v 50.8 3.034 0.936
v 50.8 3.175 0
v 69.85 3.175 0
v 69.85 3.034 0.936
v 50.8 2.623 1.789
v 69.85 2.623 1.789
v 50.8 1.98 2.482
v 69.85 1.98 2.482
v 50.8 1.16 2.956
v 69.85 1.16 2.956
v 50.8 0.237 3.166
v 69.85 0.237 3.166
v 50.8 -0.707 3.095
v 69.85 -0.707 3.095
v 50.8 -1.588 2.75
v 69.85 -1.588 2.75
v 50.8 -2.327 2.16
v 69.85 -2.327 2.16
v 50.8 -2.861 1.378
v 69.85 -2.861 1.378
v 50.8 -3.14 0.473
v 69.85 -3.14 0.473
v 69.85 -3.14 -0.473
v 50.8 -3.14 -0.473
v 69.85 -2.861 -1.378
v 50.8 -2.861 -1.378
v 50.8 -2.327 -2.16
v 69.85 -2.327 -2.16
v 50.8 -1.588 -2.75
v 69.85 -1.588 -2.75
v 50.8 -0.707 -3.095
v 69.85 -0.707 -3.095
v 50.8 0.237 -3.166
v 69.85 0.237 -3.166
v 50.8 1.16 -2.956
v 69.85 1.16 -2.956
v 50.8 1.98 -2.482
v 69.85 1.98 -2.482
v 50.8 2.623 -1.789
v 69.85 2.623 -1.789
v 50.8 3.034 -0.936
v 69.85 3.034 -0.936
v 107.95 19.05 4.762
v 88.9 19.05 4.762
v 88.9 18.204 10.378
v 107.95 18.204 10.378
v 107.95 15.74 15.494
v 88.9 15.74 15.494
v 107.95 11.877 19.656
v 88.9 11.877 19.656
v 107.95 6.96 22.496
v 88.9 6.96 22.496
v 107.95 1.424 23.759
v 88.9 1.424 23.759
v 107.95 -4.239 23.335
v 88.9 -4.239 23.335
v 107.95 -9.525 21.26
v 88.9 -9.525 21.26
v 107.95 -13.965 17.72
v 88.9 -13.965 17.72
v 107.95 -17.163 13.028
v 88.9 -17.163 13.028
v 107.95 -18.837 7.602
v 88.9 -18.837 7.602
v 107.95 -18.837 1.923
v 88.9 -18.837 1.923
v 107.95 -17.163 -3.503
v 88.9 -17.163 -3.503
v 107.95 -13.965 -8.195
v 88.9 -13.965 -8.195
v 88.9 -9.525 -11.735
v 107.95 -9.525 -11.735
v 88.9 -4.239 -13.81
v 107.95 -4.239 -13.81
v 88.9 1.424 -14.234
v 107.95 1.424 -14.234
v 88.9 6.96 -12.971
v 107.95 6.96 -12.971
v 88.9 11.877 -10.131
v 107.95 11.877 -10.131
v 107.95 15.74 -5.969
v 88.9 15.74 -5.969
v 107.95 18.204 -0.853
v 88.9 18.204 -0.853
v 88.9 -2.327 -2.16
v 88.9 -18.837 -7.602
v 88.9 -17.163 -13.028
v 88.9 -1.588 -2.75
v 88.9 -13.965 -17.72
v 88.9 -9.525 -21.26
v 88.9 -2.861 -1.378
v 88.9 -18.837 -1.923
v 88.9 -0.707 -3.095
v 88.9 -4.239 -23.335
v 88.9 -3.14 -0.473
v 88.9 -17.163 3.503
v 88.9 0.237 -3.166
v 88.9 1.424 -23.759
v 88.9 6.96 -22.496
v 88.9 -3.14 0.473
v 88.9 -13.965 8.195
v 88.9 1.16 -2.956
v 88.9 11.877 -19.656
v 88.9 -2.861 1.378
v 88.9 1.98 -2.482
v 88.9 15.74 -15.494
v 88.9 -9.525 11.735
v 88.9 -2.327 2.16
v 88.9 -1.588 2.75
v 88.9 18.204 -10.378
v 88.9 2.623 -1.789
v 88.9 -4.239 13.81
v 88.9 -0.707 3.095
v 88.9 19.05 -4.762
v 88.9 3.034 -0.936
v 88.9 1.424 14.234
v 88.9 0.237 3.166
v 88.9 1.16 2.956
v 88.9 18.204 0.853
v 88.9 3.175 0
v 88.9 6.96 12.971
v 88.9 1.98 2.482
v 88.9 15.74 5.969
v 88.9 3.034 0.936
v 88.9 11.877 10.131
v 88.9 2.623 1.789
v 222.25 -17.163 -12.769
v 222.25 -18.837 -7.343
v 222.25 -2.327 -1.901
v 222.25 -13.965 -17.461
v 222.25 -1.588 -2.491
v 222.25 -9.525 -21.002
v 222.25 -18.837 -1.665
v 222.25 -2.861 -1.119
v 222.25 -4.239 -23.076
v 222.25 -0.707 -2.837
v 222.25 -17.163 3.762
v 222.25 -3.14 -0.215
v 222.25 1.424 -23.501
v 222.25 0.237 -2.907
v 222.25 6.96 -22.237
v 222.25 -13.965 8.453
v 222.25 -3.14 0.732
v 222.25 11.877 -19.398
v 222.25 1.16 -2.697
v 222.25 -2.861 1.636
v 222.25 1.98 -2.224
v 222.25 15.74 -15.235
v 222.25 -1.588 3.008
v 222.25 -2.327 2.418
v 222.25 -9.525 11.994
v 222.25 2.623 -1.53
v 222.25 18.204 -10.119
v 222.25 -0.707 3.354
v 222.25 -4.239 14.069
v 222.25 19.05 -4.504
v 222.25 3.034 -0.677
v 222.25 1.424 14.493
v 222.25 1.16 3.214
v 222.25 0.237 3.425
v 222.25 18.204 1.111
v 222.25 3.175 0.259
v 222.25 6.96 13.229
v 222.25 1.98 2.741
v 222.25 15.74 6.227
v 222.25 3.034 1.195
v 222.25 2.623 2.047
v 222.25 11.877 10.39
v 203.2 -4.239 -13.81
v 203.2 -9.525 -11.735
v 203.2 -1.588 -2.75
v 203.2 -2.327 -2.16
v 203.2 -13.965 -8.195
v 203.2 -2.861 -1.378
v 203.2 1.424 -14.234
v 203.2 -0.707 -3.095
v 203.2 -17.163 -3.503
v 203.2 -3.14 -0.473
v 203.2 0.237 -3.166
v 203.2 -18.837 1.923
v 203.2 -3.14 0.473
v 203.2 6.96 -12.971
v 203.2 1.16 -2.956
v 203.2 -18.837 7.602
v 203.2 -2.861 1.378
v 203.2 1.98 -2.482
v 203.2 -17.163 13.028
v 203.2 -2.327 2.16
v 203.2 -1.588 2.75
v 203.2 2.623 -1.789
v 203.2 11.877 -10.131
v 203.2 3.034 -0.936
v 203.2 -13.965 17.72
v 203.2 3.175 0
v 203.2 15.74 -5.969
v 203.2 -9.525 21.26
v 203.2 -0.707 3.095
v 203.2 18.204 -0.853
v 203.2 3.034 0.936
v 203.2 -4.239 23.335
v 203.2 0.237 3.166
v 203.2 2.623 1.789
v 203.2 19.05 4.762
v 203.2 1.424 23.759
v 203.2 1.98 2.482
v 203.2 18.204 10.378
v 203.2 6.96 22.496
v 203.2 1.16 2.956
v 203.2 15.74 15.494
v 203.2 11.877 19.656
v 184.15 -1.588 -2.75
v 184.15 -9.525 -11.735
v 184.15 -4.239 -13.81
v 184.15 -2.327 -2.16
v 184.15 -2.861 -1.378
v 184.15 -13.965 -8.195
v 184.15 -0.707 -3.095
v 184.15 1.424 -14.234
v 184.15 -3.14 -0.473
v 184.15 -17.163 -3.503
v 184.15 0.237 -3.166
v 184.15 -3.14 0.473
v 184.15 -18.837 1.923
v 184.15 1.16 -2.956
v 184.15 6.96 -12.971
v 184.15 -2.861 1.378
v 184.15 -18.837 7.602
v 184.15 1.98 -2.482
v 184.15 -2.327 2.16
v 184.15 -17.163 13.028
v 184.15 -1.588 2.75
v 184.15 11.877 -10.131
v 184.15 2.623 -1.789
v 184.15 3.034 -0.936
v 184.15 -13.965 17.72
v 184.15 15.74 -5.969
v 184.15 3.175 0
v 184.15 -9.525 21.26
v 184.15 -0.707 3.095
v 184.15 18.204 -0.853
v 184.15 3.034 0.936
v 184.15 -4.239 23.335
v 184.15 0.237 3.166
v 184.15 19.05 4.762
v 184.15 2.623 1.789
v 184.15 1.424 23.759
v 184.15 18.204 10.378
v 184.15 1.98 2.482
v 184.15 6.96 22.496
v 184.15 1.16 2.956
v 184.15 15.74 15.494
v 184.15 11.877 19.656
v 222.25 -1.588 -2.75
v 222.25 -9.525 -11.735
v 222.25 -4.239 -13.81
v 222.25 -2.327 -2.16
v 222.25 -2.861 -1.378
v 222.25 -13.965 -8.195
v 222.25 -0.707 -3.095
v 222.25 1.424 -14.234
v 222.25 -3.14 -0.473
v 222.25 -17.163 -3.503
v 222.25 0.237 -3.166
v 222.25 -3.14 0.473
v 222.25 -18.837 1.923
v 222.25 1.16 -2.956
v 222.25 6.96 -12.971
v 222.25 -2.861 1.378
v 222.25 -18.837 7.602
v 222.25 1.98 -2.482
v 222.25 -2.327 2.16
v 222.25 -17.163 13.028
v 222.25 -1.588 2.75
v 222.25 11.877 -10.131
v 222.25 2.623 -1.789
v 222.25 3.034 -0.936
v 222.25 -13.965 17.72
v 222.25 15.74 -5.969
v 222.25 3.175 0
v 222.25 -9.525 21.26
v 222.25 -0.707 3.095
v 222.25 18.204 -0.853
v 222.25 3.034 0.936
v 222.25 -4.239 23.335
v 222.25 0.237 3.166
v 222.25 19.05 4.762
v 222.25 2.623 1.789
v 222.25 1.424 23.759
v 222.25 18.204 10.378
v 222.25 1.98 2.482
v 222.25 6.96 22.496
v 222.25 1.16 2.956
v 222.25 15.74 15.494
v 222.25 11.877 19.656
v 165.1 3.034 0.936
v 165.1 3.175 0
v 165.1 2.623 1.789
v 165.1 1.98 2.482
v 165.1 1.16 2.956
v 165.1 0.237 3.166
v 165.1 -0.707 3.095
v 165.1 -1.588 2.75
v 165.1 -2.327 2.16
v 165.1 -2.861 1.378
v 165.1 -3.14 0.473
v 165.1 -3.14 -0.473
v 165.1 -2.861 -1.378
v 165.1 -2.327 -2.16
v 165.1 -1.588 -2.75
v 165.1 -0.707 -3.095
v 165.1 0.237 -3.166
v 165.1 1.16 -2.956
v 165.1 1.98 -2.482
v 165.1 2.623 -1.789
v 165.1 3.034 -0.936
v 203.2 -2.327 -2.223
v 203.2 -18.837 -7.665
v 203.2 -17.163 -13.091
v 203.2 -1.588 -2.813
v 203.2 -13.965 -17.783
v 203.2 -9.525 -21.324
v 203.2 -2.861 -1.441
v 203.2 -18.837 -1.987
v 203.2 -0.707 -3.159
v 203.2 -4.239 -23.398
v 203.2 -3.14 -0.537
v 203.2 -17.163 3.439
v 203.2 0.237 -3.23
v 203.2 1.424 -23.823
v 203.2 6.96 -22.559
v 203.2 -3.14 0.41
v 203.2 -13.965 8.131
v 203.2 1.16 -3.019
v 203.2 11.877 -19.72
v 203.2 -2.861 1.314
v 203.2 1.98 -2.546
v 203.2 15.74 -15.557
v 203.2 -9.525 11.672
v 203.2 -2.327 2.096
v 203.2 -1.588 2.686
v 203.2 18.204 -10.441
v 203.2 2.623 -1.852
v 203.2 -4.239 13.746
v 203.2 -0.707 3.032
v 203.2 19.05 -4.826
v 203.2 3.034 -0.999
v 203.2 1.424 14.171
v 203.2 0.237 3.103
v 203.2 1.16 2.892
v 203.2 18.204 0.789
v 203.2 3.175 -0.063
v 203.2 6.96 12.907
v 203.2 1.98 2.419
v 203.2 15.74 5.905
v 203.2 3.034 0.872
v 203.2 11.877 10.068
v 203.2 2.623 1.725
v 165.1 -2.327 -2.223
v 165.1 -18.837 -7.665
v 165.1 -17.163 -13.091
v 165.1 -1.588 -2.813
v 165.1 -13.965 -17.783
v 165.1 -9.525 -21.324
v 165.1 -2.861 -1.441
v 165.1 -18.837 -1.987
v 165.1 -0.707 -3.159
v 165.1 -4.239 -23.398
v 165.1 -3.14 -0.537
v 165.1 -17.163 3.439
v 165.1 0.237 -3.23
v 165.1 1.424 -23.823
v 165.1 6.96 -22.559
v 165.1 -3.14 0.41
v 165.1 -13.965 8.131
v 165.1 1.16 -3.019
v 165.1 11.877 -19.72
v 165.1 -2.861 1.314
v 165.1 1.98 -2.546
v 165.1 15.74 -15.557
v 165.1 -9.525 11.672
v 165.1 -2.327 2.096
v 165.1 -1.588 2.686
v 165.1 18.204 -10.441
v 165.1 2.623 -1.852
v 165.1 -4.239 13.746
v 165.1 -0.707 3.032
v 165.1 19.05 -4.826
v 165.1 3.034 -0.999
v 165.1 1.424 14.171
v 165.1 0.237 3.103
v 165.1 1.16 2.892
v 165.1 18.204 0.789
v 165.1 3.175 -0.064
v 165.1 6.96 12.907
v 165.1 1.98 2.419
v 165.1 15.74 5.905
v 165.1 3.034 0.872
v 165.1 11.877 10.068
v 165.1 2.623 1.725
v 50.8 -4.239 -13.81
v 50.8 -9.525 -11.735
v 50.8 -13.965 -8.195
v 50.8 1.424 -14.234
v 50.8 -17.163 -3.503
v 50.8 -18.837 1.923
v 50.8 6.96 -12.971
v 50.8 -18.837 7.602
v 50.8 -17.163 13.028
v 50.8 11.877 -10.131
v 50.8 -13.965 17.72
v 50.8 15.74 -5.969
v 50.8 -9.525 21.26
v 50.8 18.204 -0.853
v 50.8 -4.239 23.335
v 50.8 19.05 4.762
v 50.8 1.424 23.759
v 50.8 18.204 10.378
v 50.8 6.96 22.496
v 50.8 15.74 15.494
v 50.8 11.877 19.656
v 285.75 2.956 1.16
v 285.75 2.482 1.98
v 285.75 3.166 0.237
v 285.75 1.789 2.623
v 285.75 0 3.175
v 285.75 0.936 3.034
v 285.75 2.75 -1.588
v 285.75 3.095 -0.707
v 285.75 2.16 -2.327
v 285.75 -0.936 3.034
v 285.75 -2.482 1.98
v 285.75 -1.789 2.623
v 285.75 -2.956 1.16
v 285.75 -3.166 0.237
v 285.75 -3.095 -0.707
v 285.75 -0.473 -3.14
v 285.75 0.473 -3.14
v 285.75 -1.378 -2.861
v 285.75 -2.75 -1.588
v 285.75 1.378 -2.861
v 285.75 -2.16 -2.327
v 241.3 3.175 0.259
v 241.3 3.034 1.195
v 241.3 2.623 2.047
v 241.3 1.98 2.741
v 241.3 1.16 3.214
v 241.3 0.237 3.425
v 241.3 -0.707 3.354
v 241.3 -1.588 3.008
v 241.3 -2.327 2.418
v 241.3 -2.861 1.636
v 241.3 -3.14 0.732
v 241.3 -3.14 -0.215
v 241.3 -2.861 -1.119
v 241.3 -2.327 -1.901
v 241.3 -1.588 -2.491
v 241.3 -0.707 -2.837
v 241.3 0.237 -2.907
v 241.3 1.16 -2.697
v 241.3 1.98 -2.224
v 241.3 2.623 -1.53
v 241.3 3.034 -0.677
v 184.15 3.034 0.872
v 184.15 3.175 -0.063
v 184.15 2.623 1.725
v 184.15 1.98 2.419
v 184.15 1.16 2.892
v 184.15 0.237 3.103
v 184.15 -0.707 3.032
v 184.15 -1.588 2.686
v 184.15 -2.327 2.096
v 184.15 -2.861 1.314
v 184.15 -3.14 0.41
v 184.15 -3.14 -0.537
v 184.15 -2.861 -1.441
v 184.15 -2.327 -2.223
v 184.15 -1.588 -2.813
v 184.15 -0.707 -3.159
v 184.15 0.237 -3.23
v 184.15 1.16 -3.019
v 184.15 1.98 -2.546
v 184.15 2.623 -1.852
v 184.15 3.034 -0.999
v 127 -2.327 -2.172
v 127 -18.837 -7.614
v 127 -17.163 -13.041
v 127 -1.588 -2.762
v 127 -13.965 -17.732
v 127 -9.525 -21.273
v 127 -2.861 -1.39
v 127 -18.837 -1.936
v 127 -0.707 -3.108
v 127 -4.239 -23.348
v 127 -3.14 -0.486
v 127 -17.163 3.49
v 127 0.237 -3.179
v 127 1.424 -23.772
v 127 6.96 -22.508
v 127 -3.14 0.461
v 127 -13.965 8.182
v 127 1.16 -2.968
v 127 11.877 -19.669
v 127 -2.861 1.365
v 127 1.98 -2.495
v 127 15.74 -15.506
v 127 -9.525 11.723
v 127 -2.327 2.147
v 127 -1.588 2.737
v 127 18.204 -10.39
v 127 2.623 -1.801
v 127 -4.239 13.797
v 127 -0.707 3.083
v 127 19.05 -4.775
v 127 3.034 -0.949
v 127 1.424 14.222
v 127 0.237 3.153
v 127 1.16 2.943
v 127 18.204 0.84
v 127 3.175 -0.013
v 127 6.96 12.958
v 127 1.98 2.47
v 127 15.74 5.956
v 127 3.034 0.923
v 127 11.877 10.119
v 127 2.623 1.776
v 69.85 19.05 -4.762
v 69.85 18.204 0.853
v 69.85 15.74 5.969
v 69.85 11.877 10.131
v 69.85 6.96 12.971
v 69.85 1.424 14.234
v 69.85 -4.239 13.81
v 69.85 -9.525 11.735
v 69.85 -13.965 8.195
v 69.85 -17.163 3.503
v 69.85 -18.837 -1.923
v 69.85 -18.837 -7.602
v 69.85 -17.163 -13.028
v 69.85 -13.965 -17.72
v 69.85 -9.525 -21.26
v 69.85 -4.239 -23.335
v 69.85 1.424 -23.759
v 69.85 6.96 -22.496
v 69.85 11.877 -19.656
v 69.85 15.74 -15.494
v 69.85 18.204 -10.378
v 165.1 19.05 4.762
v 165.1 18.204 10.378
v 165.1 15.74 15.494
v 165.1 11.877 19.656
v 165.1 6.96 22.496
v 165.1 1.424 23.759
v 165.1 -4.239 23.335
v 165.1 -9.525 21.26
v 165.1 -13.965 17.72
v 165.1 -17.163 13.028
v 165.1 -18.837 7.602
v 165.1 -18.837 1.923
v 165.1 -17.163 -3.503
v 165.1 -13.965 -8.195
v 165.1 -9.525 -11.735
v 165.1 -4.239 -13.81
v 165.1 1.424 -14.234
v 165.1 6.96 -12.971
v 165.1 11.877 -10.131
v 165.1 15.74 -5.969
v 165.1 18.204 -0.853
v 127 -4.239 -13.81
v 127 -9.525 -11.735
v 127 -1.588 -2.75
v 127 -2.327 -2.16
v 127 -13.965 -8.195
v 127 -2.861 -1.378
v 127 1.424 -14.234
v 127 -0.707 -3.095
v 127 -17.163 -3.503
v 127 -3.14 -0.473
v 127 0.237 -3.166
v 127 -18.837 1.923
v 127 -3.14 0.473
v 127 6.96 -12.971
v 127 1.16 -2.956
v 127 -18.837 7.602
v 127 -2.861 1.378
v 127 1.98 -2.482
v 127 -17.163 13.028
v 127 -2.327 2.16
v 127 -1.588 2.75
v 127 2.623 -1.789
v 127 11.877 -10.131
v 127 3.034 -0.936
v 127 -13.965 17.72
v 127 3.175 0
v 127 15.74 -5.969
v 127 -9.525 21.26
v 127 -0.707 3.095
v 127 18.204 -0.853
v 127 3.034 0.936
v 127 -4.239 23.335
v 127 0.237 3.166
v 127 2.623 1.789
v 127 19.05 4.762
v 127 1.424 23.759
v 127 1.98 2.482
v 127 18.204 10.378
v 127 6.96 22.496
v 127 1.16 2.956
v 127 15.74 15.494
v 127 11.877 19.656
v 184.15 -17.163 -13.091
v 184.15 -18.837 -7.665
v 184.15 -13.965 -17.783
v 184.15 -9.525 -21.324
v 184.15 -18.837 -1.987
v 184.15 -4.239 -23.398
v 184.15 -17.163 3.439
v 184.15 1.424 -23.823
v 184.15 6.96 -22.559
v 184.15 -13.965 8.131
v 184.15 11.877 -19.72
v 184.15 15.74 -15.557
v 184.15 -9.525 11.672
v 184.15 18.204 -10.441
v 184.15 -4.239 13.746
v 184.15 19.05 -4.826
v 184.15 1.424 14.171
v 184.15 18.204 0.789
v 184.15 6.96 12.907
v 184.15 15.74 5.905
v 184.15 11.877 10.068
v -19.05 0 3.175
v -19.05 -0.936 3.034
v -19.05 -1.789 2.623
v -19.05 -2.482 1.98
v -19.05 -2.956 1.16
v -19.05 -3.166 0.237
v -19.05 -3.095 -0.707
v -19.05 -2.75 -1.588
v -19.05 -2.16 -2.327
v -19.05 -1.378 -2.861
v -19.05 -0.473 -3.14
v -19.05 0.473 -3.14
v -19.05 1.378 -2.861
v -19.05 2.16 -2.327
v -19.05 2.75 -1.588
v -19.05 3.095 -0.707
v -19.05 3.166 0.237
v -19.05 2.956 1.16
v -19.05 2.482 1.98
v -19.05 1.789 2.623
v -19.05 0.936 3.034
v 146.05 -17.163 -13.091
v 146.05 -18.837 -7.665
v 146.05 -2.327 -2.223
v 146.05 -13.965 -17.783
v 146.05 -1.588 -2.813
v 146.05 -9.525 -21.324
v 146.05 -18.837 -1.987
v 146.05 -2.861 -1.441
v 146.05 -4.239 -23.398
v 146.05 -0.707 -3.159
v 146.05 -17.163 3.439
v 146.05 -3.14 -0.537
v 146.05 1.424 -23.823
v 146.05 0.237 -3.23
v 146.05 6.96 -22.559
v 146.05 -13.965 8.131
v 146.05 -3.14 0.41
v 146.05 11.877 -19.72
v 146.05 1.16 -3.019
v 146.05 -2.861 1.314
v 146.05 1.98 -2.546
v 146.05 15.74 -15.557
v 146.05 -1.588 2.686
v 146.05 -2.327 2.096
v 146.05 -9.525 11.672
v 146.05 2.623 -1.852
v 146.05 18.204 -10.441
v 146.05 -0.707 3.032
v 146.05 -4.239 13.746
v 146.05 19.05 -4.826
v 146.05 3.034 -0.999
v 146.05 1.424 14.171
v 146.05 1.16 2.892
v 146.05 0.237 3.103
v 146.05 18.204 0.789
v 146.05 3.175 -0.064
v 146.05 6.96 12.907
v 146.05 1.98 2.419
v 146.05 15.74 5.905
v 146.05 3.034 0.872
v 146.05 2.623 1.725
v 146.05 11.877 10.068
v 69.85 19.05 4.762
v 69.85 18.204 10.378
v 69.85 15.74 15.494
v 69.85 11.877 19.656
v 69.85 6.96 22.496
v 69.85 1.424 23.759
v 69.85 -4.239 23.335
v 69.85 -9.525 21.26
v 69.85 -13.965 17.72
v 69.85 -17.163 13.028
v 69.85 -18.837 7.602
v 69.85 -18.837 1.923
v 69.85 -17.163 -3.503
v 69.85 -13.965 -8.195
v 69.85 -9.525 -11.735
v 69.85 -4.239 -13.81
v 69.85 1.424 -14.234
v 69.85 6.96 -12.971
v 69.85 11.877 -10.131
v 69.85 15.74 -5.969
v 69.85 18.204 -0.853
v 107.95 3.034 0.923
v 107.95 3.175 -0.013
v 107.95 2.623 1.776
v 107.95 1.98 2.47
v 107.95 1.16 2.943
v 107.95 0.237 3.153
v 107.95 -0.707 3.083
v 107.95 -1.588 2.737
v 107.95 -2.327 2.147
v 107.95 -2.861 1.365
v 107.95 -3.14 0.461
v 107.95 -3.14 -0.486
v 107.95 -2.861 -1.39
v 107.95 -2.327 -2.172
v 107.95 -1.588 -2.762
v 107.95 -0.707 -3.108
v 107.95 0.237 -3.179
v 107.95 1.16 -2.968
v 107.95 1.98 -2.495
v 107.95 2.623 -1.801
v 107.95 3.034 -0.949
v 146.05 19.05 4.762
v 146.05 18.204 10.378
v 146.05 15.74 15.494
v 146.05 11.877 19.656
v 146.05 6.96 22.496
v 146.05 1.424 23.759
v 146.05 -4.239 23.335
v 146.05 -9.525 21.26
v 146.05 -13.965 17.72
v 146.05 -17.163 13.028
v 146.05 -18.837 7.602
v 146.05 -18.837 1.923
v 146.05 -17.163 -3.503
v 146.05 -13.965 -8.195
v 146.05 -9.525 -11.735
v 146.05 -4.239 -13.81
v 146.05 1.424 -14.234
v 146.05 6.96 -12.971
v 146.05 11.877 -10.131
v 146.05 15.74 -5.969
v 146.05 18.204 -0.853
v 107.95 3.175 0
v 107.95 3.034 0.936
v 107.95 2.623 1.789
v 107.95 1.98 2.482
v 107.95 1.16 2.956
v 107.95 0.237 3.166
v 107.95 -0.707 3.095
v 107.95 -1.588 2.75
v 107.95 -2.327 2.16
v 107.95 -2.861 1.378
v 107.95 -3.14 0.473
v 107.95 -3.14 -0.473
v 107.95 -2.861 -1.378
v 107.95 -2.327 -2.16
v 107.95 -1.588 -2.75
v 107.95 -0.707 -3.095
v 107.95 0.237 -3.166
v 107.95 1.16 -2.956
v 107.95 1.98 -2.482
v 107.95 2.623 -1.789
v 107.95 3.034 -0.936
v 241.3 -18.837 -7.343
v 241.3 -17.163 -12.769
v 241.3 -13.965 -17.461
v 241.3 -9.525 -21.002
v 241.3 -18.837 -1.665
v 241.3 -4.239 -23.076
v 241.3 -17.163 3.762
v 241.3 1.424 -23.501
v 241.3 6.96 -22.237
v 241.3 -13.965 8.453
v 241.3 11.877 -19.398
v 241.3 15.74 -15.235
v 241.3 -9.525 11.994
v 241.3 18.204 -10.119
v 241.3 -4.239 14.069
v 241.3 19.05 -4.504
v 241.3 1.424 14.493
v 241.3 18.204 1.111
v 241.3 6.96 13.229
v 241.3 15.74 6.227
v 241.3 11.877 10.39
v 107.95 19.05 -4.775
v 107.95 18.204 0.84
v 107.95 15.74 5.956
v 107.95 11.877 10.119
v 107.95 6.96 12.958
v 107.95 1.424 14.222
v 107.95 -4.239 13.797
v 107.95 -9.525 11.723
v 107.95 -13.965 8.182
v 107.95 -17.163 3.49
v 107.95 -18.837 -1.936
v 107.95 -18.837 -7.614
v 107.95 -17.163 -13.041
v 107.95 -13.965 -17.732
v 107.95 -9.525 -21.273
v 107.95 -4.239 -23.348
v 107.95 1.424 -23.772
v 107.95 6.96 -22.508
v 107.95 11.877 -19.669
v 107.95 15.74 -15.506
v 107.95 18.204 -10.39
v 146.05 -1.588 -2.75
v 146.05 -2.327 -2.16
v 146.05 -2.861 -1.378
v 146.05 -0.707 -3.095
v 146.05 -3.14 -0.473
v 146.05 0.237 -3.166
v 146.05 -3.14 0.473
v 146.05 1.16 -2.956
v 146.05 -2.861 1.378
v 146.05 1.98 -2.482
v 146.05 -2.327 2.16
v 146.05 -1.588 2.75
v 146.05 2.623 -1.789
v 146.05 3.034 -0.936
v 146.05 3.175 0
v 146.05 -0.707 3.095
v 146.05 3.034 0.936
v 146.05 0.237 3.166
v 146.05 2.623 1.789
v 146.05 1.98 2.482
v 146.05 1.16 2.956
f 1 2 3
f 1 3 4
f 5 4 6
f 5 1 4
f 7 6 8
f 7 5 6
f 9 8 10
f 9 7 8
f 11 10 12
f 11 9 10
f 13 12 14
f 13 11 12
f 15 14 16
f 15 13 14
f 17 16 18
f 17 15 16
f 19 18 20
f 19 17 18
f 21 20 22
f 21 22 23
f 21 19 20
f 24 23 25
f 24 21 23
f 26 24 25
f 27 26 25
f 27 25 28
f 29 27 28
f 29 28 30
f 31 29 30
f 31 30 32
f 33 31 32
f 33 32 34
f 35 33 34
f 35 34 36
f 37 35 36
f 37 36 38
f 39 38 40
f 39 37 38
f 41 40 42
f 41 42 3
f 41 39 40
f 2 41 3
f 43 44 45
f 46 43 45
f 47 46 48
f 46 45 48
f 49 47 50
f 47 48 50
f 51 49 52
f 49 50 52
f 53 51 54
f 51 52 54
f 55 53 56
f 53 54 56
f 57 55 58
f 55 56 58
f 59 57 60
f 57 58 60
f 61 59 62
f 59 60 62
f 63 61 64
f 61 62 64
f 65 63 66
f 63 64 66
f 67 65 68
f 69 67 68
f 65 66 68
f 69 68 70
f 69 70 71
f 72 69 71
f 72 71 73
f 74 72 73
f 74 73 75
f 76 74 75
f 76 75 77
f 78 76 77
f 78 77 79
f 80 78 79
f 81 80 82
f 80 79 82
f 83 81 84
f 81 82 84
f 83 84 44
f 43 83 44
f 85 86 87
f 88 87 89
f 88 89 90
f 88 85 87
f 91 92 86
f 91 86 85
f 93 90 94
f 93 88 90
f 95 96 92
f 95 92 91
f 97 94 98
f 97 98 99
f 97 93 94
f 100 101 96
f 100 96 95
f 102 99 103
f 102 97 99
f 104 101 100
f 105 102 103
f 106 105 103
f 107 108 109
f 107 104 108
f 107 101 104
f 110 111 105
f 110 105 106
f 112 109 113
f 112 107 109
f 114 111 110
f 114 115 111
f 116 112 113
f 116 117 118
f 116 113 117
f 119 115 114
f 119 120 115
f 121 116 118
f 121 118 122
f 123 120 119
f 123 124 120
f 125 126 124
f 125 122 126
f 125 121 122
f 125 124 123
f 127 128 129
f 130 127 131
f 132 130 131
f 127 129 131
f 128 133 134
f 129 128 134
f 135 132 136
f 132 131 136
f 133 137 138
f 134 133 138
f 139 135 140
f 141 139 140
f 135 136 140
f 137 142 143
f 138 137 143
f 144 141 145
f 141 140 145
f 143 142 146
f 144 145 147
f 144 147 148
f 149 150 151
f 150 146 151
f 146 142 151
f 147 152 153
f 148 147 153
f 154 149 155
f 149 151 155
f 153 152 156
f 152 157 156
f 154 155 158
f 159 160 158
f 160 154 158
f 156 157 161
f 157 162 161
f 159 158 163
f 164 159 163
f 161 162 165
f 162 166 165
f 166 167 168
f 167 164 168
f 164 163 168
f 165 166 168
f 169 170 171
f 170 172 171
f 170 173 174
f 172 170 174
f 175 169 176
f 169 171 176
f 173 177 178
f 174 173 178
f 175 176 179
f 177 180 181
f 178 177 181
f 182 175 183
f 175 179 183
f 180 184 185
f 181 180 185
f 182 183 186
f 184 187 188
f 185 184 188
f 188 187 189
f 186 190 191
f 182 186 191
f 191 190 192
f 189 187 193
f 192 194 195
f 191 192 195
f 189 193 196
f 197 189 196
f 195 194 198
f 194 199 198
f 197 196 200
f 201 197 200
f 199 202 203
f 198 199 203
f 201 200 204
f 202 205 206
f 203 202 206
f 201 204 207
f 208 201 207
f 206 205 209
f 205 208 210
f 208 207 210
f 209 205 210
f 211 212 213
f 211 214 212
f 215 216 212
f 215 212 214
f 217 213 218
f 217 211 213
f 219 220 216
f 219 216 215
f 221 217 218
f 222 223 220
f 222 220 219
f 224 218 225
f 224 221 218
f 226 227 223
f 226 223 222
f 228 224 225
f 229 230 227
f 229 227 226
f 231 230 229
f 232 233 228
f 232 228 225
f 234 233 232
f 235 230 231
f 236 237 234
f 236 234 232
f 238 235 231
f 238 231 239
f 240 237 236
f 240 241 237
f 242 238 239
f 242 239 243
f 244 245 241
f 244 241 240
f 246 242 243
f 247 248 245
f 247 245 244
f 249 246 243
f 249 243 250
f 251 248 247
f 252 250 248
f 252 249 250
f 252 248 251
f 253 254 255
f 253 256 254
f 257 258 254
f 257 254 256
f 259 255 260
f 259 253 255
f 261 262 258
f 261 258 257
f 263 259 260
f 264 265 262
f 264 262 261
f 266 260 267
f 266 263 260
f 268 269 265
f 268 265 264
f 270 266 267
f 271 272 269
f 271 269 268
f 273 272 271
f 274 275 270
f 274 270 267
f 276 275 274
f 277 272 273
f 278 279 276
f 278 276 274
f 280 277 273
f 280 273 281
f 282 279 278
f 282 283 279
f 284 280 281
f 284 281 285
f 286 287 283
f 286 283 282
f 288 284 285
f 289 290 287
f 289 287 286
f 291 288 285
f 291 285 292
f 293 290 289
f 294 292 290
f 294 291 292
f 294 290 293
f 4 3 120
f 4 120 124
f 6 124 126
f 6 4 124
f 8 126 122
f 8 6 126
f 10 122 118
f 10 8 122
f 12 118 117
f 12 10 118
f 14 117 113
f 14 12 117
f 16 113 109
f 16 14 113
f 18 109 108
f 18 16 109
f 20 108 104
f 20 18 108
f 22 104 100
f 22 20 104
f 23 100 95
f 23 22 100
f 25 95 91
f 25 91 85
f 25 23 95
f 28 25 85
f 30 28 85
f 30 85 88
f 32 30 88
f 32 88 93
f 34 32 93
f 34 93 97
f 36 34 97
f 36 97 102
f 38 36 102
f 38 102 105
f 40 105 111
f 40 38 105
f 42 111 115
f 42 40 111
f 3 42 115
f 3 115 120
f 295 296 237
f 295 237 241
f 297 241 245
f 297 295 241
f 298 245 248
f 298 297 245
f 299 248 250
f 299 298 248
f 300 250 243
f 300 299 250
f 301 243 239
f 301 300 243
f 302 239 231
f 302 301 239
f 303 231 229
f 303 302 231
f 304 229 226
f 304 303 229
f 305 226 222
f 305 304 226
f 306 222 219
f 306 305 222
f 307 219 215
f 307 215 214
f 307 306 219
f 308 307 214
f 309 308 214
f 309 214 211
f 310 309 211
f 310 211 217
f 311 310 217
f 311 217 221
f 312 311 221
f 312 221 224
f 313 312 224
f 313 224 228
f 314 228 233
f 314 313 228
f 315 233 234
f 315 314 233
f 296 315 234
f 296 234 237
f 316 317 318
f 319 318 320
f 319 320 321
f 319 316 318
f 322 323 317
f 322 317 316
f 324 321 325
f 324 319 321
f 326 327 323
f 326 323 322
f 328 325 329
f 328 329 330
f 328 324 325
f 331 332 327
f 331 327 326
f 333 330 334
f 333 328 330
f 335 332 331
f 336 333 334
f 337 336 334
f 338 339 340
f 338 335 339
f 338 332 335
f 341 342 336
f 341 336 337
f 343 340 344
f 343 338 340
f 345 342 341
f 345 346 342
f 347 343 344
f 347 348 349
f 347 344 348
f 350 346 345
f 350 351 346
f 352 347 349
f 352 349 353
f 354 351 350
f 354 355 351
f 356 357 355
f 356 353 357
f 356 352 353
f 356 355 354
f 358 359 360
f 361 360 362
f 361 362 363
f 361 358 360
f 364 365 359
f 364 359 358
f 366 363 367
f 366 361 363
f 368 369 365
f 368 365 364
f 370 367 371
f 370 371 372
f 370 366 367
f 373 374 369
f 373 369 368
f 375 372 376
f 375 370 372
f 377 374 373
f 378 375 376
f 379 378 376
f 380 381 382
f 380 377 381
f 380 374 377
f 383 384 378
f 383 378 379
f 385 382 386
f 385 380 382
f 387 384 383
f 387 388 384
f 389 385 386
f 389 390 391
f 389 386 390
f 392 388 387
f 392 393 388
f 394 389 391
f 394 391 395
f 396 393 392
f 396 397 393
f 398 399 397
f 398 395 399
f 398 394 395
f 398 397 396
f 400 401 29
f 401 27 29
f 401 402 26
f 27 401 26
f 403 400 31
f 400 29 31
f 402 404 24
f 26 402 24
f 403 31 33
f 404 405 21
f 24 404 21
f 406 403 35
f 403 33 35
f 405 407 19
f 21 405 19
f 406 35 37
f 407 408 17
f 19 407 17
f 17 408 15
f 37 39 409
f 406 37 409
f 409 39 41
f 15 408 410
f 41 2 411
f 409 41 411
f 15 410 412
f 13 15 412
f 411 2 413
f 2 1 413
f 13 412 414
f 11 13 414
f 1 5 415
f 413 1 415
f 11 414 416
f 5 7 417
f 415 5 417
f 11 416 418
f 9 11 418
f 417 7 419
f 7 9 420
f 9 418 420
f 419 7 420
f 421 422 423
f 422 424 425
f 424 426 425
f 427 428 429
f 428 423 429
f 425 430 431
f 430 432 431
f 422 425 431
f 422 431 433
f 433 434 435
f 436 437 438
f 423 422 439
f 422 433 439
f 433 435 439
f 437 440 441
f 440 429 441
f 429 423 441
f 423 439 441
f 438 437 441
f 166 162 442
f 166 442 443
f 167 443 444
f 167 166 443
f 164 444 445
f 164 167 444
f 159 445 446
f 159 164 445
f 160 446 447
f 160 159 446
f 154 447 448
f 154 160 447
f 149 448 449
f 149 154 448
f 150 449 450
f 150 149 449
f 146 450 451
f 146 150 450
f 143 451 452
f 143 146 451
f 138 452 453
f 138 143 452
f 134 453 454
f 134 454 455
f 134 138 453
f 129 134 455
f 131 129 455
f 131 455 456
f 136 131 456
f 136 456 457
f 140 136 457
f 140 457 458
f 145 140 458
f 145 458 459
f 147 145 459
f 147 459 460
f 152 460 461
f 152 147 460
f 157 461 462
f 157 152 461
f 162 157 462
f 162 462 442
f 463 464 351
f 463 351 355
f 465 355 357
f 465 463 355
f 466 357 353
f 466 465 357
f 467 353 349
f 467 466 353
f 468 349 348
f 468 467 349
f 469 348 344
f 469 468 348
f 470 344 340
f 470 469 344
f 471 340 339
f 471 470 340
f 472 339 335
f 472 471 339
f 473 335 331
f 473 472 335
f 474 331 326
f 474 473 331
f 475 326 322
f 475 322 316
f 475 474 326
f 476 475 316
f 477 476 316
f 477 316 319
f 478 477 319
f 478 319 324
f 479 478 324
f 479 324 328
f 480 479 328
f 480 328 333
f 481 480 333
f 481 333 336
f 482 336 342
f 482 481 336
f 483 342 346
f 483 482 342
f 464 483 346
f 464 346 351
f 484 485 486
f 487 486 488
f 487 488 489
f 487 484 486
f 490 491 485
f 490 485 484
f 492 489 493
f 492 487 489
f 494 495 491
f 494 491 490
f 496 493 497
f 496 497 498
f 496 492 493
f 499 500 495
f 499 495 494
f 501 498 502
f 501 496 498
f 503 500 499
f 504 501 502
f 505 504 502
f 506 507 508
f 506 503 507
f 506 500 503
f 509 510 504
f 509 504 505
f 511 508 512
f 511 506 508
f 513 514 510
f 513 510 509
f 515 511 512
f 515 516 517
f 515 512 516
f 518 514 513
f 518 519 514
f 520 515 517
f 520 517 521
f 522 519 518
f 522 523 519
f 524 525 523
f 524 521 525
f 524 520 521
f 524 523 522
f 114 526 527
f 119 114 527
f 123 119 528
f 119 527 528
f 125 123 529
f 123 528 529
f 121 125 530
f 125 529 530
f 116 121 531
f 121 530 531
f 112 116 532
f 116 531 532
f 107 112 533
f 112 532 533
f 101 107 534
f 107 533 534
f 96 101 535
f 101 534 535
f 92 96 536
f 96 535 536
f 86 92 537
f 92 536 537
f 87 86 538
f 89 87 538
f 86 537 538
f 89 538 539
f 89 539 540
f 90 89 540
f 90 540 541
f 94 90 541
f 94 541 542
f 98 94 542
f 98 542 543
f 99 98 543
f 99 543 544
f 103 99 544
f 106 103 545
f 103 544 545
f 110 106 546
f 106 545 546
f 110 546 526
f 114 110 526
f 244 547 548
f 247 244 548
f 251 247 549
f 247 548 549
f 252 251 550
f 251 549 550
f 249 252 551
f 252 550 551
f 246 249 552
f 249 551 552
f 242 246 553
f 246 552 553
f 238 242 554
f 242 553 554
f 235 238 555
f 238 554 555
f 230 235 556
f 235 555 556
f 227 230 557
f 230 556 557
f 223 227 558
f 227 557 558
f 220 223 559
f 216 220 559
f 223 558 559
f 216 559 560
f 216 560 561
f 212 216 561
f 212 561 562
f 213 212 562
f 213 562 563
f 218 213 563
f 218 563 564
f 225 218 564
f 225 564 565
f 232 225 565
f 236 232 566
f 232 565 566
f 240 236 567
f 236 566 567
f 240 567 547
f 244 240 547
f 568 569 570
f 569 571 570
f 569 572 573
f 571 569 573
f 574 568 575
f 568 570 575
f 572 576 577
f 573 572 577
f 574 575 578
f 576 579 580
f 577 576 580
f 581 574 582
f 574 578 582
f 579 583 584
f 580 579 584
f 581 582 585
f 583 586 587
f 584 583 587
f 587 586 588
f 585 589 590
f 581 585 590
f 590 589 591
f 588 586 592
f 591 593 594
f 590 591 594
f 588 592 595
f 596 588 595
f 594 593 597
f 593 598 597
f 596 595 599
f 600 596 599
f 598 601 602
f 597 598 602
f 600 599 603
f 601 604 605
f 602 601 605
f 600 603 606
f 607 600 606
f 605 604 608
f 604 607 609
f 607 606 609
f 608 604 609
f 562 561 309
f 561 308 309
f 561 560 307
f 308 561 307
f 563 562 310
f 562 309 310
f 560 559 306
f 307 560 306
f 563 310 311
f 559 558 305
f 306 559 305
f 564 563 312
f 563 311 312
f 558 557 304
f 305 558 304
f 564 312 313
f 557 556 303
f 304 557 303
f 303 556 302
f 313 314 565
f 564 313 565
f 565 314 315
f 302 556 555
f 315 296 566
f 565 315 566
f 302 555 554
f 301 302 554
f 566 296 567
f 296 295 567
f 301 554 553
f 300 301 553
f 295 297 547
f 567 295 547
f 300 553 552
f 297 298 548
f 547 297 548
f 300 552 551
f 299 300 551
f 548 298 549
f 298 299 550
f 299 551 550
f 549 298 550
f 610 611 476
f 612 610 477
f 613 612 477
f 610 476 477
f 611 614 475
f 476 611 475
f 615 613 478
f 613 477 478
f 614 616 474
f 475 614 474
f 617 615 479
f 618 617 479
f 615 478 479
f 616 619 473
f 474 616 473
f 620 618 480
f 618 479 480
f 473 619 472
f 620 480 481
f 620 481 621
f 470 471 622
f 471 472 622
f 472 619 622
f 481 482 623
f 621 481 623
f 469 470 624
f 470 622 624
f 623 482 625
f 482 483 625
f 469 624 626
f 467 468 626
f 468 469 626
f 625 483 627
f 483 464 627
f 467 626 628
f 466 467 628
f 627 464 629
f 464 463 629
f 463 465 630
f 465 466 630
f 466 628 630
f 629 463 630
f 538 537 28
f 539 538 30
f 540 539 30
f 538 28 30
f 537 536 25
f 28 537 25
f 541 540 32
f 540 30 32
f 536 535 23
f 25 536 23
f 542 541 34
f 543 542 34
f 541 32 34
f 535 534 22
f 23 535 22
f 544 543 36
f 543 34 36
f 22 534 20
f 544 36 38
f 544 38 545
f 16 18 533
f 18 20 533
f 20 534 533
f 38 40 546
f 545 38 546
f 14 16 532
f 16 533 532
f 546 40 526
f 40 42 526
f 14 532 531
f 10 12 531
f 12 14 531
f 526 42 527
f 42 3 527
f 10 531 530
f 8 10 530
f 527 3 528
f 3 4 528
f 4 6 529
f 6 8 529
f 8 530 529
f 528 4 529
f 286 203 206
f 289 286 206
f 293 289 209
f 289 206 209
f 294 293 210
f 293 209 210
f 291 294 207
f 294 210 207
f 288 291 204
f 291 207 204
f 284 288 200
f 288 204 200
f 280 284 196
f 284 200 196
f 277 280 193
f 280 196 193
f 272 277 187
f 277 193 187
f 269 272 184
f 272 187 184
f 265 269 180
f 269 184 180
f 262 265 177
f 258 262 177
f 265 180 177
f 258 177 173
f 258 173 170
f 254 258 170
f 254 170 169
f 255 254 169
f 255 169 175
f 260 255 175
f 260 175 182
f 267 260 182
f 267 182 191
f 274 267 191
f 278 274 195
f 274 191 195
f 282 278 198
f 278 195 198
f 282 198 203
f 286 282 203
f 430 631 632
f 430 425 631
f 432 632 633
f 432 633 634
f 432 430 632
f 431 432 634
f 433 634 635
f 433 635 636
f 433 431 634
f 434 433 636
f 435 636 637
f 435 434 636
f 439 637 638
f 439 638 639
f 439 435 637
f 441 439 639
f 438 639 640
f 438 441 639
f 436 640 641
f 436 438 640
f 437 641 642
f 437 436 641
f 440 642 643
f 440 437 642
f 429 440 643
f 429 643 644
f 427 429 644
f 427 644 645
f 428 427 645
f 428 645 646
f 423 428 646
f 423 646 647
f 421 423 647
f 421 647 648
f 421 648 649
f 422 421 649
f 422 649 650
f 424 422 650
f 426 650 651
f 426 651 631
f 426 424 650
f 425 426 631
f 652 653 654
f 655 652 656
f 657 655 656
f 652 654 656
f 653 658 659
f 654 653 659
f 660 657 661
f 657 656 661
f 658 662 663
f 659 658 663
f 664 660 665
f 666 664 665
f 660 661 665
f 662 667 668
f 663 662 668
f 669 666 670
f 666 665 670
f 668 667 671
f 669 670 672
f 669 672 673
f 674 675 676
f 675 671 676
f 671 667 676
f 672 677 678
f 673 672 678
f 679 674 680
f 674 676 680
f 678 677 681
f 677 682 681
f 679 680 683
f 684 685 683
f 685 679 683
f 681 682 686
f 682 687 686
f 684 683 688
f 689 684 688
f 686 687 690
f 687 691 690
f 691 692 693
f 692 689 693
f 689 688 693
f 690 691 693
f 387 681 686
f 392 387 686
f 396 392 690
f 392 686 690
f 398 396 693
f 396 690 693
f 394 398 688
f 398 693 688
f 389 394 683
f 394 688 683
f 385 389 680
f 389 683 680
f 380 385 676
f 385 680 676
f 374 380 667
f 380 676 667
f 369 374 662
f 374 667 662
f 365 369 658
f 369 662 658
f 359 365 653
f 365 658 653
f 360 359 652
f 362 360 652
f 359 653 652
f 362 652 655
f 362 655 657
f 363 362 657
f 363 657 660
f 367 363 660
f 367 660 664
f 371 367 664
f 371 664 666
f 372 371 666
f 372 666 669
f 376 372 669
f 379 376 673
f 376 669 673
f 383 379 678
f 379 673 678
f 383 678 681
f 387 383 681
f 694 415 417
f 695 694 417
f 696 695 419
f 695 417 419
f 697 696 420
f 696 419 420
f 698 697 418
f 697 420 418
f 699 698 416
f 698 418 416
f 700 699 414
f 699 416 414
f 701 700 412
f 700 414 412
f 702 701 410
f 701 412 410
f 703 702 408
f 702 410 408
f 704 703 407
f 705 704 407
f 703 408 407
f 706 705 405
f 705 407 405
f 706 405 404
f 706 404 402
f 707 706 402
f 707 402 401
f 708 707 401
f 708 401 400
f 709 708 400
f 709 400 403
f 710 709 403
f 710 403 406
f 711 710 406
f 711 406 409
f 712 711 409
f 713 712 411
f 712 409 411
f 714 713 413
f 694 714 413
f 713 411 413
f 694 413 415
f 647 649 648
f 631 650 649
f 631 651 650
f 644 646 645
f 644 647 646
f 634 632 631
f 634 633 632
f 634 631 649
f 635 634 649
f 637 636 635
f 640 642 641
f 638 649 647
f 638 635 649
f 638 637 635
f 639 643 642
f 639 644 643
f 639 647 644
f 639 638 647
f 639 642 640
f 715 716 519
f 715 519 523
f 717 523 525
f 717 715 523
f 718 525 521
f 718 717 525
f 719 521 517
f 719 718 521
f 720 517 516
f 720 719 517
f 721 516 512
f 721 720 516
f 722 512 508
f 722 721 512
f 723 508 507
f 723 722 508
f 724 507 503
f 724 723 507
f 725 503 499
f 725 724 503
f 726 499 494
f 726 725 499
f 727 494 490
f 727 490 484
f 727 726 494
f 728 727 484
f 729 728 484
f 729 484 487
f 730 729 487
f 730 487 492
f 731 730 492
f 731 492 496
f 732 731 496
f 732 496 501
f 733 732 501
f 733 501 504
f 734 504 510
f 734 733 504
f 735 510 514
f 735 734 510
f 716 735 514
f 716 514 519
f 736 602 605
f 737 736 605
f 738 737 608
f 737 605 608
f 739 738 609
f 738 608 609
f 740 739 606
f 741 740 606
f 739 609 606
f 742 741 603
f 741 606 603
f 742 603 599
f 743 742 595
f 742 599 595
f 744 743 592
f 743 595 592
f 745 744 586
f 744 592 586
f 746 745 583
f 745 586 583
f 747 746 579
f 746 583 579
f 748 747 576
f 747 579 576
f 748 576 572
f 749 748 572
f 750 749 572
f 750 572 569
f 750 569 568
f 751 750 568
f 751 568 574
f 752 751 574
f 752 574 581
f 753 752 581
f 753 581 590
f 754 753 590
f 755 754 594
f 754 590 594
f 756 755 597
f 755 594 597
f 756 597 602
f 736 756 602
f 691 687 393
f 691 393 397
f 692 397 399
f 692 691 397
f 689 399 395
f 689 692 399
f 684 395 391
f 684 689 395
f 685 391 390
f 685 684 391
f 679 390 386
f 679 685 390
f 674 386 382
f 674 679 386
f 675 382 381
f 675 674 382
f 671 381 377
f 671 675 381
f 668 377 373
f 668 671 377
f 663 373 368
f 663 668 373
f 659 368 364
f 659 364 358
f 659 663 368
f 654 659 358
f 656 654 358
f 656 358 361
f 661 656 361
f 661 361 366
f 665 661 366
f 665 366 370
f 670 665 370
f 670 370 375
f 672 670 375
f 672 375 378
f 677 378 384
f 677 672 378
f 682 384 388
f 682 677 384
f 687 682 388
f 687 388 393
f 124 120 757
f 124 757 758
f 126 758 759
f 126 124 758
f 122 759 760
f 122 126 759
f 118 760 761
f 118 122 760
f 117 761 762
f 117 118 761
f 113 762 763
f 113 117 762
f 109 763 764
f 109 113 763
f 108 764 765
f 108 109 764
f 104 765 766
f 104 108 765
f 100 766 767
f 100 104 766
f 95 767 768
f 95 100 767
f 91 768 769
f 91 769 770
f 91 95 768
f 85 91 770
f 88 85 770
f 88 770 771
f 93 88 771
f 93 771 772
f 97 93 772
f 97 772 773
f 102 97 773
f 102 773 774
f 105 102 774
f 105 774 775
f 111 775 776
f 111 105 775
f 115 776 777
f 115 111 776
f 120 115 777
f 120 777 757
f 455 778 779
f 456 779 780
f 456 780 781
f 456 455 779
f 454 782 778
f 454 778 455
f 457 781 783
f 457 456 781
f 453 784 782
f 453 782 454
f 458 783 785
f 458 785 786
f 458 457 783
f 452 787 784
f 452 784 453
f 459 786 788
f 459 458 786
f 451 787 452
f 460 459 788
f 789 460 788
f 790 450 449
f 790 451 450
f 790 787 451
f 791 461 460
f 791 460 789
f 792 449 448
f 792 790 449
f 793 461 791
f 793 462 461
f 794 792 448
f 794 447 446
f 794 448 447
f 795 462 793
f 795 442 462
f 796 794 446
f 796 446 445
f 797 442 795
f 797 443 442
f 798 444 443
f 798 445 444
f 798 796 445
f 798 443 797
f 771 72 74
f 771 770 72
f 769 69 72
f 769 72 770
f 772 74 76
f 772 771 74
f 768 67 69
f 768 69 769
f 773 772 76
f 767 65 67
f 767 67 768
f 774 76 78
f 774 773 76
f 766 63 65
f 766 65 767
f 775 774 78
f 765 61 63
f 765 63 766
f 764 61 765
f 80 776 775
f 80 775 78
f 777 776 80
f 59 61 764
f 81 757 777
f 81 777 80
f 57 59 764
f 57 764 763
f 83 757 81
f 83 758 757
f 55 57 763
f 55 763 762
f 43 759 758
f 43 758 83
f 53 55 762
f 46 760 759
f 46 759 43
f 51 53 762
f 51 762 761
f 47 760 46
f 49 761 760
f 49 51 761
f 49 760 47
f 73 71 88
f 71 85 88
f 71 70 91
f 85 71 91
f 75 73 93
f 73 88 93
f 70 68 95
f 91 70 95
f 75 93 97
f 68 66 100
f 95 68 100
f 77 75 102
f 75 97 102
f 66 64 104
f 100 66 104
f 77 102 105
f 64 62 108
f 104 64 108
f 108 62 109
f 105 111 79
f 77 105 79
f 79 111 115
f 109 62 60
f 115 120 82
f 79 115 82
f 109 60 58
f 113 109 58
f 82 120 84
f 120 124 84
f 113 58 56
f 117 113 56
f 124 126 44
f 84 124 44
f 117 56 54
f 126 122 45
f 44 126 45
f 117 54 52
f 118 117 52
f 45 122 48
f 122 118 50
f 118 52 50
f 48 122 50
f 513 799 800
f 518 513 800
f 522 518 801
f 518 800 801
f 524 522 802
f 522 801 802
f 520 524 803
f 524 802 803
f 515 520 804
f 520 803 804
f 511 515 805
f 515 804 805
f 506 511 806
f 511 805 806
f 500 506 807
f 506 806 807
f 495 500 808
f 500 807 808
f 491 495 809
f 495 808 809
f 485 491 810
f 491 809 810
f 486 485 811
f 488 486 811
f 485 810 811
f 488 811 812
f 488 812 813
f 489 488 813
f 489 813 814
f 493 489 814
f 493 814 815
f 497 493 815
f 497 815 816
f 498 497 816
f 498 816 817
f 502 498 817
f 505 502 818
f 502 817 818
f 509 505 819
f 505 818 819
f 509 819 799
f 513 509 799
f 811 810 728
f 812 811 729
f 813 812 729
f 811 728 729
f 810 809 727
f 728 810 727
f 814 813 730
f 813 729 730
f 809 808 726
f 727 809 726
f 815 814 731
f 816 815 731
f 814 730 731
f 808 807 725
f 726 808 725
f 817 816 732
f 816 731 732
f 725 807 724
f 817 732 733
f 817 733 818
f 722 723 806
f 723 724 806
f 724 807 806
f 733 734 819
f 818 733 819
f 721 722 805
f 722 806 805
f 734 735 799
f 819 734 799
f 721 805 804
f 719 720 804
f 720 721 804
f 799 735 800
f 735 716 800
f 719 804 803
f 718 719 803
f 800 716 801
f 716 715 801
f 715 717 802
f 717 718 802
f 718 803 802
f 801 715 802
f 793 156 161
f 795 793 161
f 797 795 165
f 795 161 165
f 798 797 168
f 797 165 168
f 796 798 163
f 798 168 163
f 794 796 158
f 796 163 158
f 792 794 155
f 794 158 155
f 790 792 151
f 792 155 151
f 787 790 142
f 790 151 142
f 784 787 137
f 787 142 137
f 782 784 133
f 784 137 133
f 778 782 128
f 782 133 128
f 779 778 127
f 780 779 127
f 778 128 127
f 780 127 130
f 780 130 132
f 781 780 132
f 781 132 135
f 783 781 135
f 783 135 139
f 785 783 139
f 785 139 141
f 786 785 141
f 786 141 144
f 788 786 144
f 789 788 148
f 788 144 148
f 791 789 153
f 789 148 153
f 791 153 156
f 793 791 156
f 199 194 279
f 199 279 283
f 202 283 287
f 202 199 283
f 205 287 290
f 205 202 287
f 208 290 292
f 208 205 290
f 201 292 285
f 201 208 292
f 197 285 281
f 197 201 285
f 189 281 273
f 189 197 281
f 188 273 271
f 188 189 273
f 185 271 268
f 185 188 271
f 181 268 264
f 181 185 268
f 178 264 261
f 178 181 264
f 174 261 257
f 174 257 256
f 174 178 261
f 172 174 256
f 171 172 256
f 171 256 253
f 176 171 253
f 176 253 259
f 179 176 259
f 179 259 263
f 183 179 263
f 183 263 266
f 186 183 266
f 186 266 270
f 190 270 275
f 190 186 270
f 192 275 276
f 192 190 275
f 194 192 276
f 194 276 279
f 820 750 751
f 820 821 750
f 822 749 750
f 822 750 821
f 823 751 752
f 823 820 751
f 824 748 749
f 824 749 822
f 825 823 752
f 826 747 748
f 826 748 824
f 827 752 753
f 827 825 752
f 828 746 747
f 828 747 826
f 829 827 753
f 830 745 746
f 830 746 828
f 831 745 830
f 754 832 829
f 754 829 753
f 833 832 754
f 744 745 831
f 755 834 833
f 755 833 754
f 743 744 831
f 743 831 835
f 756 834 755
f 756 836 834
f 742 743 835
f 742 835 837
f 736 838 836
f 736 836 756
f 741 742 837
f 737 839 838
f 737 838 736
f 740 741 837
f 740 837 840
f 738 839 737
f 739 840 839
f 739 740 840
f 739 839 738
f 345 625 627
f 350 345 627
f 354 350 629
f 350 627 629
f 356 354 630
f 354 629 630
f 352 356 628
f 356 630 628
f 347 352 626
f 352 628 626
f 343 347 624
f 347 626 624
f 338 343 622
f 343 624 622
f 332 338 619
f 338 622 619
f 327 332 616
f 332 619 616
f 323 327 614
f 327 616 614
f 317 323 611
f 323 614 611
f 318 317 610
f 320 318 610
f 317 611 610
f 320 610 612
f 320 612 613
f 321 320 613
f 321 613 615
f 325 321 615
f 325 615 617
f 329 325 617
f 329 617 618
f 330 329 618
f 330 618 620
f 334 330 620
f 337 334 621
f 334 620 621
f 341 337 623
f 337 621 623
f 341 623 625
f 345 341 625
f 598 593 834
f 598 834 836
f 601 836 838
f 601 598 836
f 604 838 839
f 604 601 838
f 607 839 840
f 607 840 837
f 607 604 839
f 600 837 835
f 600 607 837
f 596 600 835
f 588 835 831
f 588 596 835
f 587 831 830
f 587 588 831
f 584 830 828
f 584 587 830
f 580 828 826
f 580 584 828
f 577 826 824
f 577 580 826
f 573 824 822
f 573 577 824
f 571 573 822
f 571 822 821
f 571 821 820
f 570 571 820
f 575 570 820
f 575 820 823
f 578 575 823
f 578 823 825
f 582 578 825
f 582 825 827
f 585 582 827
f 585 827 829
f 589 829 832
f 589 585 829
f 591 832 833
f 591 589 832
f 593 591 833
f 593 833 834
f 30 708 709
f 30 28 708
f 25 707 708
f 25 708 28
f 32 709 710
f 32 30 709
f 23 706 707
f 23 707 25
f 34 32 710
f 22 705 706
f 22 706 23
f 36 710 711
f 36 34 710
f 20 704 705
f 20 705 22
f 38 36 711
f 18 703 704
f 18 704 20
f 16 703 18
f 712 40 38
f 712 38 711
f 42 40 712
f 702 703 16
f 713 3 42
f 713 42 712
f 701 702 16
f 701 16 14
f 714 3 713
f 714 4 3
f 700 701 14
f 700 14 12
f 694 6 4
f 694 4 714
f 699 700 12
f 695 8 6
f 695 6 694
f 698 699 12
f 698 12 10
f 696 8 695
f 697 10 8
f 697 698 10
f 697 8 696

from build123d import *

# Parameters (mm, degrees)
F1_R      = 19.05
F1_R_2    = 3.175
F20_DEPTH = 19.05
F15_R     = 19.05
F15_R_2   = 3.175
F11_R     = 19.05
F11_R_2   = 3.175
F16_R     = 19.05
F16_R_2   = 3.175
F12_R     = 19.05
F12_R_2   = 3.175
F17_R     = 19.05
F17_R_2   = 3.175
F13_R     = 19.05
F13_R_2   = 3.175
F18_R     = 19.05
F18_R_2   = 3.175
F14_R     = 19.05
F14_R_2   = 3.175
F19_R     = 19.05
F19_R_2   = 3.175
F21_W     = 304.8
F21_H     = 3.175


with BuildPart() as f20:
    # F1 (on offset) → F20 (new body)
    with BuildSketch(Plane.YZ.offset(50.8)):
        with Locations((0, 4.7625)):
            Circle(F1_R)
        Circle(F1_R_2, mode=Mode.SUBTRACT)
    extrude(amount=F20_DEPTH)


with BuildPart() as f20b:
    # F15 (on offset) → F20, piece 2 (new body)
    with BuildSketch(Plane.YZ.offset(69.85)):
        with Locations((0, -4.7625)):
            Circle(F15_R)
        Circle(F15_R_2, mode=Mode.SUBTRACT)
    extrude(amount=F20_DEPTH)


with BuildPart() as f20c:
    # F11 (on offset) → F20, piece 3 (new body)
    with BuildSketch(Plane.YZ.offset(88.9)):
        with Locations((0, 4.7625)):
            Circle(F11_R)
        Circle(F11_R_2, mode=Mode.SUBTRACT)
    extrude(amount=F20_DEPTH)


with BuildPart() as f20d:
    # F16 (on offset) → F20, piece 4 (new body)
    with BuildSketch(Plane.YZ.offset(107.95)):
        with Locations((0, -4.7751972452)):
            Circle(F16_R)
        with Locations((0, -0.0126972452)):
            Circle(F16_R_2, mode=Mode.SUBTRACT)
    extrude(amount=F20_DEPTH)


with BuildPart() as f20e:
    # F12 (on offset) → F20, piece 5 (new body)
    with BuildSketch(Plane.YZ.offset(127)):
        with Locations((0, 4.7625)):
            Circle(F12_R)
        Circle(F12_R_2, mode=Mode.SUBTRACT)
    extrude(amount=F20_DEPTH)


with BuildPart() as f20f:
    # F17 (on offset) → F20, piece 6 (new body)
    with BuildSketch(Plane.YZ.offset(146.05)):
        with Locations((0, -4.826000426)):
            Circle(F17_R)
        with Locations((0, -0.063500426)):
            Circle(F17_R_2, mode=Mode.SUBTRACT)
    extrude(amount=F20_DEPTH)


with BuildPart() as f20g:
    # F13 (on offset) → F20, piece 7 (new body)
    with BuildSketch(Plane.YZ.offset(165.1)):
        with Locations((0, 4.7625)):
            Circle(F13_R)
        Circle(F13_R_2, mode=Mode.SUBTRACT)
    extrude(amount=F20_DEPTH)


with BuildPart() as f20h:
    # F18 (on offset) → F20, piece 8 (new body)
    with BuildSketch(Plane.YZ.offset(184.15)):
        with Locations((0, -4.8259999603)):
            Circle(F18_R)
        with Locations((0, -0.0634999603)):
            Circle(F18_R_2, mode=Mode.SUBTRACT)
    extrude(amount=F20_DEPTH)


with BuildPart() as f20i:
    # F14 (on offset) → F20, piece 9 (new body)
    with BuildSketch(Plane.YZ.offset(203.2)):
        with Locations((0, 4.7625)):
            Circle(F14_R)
        Circle(F14_R_2, mode=Mode.SUBTRACT)
    extrude(amount=F20_DEPTH)


with BuildPart() as f20j:
    # F19 (on offset) → F20, piece 10 (new body)
    with BuildSketch(Plane.YZ.offset(222.25)):
        with Locations((0, -4.5038438402)):
            Circle(F19_R)
        with Locations((0, 0.2586561598)):
            Circle(F19_R_2, mode=Mode.SUBTRACT)
    extrude(amount=F20_DEPTH)


with BuildPart() as f22:
    # F21 (on Front) → F22 (revolve)
    with BuildSketch(Plane.XZ):
        with Locations((133.35, 1.5875)):
            Rectangle(F21_W, F21_H)
    revolve(axis=Axis((133.35, 0, 0), (1, 0, 0)))


solid = Compound([f20.part, f20b.part, f20c.part, f20d.part, f20e.part, f20f.part, f20g.part, f20h.part, f20i.part, f20j.part, f22.part])
